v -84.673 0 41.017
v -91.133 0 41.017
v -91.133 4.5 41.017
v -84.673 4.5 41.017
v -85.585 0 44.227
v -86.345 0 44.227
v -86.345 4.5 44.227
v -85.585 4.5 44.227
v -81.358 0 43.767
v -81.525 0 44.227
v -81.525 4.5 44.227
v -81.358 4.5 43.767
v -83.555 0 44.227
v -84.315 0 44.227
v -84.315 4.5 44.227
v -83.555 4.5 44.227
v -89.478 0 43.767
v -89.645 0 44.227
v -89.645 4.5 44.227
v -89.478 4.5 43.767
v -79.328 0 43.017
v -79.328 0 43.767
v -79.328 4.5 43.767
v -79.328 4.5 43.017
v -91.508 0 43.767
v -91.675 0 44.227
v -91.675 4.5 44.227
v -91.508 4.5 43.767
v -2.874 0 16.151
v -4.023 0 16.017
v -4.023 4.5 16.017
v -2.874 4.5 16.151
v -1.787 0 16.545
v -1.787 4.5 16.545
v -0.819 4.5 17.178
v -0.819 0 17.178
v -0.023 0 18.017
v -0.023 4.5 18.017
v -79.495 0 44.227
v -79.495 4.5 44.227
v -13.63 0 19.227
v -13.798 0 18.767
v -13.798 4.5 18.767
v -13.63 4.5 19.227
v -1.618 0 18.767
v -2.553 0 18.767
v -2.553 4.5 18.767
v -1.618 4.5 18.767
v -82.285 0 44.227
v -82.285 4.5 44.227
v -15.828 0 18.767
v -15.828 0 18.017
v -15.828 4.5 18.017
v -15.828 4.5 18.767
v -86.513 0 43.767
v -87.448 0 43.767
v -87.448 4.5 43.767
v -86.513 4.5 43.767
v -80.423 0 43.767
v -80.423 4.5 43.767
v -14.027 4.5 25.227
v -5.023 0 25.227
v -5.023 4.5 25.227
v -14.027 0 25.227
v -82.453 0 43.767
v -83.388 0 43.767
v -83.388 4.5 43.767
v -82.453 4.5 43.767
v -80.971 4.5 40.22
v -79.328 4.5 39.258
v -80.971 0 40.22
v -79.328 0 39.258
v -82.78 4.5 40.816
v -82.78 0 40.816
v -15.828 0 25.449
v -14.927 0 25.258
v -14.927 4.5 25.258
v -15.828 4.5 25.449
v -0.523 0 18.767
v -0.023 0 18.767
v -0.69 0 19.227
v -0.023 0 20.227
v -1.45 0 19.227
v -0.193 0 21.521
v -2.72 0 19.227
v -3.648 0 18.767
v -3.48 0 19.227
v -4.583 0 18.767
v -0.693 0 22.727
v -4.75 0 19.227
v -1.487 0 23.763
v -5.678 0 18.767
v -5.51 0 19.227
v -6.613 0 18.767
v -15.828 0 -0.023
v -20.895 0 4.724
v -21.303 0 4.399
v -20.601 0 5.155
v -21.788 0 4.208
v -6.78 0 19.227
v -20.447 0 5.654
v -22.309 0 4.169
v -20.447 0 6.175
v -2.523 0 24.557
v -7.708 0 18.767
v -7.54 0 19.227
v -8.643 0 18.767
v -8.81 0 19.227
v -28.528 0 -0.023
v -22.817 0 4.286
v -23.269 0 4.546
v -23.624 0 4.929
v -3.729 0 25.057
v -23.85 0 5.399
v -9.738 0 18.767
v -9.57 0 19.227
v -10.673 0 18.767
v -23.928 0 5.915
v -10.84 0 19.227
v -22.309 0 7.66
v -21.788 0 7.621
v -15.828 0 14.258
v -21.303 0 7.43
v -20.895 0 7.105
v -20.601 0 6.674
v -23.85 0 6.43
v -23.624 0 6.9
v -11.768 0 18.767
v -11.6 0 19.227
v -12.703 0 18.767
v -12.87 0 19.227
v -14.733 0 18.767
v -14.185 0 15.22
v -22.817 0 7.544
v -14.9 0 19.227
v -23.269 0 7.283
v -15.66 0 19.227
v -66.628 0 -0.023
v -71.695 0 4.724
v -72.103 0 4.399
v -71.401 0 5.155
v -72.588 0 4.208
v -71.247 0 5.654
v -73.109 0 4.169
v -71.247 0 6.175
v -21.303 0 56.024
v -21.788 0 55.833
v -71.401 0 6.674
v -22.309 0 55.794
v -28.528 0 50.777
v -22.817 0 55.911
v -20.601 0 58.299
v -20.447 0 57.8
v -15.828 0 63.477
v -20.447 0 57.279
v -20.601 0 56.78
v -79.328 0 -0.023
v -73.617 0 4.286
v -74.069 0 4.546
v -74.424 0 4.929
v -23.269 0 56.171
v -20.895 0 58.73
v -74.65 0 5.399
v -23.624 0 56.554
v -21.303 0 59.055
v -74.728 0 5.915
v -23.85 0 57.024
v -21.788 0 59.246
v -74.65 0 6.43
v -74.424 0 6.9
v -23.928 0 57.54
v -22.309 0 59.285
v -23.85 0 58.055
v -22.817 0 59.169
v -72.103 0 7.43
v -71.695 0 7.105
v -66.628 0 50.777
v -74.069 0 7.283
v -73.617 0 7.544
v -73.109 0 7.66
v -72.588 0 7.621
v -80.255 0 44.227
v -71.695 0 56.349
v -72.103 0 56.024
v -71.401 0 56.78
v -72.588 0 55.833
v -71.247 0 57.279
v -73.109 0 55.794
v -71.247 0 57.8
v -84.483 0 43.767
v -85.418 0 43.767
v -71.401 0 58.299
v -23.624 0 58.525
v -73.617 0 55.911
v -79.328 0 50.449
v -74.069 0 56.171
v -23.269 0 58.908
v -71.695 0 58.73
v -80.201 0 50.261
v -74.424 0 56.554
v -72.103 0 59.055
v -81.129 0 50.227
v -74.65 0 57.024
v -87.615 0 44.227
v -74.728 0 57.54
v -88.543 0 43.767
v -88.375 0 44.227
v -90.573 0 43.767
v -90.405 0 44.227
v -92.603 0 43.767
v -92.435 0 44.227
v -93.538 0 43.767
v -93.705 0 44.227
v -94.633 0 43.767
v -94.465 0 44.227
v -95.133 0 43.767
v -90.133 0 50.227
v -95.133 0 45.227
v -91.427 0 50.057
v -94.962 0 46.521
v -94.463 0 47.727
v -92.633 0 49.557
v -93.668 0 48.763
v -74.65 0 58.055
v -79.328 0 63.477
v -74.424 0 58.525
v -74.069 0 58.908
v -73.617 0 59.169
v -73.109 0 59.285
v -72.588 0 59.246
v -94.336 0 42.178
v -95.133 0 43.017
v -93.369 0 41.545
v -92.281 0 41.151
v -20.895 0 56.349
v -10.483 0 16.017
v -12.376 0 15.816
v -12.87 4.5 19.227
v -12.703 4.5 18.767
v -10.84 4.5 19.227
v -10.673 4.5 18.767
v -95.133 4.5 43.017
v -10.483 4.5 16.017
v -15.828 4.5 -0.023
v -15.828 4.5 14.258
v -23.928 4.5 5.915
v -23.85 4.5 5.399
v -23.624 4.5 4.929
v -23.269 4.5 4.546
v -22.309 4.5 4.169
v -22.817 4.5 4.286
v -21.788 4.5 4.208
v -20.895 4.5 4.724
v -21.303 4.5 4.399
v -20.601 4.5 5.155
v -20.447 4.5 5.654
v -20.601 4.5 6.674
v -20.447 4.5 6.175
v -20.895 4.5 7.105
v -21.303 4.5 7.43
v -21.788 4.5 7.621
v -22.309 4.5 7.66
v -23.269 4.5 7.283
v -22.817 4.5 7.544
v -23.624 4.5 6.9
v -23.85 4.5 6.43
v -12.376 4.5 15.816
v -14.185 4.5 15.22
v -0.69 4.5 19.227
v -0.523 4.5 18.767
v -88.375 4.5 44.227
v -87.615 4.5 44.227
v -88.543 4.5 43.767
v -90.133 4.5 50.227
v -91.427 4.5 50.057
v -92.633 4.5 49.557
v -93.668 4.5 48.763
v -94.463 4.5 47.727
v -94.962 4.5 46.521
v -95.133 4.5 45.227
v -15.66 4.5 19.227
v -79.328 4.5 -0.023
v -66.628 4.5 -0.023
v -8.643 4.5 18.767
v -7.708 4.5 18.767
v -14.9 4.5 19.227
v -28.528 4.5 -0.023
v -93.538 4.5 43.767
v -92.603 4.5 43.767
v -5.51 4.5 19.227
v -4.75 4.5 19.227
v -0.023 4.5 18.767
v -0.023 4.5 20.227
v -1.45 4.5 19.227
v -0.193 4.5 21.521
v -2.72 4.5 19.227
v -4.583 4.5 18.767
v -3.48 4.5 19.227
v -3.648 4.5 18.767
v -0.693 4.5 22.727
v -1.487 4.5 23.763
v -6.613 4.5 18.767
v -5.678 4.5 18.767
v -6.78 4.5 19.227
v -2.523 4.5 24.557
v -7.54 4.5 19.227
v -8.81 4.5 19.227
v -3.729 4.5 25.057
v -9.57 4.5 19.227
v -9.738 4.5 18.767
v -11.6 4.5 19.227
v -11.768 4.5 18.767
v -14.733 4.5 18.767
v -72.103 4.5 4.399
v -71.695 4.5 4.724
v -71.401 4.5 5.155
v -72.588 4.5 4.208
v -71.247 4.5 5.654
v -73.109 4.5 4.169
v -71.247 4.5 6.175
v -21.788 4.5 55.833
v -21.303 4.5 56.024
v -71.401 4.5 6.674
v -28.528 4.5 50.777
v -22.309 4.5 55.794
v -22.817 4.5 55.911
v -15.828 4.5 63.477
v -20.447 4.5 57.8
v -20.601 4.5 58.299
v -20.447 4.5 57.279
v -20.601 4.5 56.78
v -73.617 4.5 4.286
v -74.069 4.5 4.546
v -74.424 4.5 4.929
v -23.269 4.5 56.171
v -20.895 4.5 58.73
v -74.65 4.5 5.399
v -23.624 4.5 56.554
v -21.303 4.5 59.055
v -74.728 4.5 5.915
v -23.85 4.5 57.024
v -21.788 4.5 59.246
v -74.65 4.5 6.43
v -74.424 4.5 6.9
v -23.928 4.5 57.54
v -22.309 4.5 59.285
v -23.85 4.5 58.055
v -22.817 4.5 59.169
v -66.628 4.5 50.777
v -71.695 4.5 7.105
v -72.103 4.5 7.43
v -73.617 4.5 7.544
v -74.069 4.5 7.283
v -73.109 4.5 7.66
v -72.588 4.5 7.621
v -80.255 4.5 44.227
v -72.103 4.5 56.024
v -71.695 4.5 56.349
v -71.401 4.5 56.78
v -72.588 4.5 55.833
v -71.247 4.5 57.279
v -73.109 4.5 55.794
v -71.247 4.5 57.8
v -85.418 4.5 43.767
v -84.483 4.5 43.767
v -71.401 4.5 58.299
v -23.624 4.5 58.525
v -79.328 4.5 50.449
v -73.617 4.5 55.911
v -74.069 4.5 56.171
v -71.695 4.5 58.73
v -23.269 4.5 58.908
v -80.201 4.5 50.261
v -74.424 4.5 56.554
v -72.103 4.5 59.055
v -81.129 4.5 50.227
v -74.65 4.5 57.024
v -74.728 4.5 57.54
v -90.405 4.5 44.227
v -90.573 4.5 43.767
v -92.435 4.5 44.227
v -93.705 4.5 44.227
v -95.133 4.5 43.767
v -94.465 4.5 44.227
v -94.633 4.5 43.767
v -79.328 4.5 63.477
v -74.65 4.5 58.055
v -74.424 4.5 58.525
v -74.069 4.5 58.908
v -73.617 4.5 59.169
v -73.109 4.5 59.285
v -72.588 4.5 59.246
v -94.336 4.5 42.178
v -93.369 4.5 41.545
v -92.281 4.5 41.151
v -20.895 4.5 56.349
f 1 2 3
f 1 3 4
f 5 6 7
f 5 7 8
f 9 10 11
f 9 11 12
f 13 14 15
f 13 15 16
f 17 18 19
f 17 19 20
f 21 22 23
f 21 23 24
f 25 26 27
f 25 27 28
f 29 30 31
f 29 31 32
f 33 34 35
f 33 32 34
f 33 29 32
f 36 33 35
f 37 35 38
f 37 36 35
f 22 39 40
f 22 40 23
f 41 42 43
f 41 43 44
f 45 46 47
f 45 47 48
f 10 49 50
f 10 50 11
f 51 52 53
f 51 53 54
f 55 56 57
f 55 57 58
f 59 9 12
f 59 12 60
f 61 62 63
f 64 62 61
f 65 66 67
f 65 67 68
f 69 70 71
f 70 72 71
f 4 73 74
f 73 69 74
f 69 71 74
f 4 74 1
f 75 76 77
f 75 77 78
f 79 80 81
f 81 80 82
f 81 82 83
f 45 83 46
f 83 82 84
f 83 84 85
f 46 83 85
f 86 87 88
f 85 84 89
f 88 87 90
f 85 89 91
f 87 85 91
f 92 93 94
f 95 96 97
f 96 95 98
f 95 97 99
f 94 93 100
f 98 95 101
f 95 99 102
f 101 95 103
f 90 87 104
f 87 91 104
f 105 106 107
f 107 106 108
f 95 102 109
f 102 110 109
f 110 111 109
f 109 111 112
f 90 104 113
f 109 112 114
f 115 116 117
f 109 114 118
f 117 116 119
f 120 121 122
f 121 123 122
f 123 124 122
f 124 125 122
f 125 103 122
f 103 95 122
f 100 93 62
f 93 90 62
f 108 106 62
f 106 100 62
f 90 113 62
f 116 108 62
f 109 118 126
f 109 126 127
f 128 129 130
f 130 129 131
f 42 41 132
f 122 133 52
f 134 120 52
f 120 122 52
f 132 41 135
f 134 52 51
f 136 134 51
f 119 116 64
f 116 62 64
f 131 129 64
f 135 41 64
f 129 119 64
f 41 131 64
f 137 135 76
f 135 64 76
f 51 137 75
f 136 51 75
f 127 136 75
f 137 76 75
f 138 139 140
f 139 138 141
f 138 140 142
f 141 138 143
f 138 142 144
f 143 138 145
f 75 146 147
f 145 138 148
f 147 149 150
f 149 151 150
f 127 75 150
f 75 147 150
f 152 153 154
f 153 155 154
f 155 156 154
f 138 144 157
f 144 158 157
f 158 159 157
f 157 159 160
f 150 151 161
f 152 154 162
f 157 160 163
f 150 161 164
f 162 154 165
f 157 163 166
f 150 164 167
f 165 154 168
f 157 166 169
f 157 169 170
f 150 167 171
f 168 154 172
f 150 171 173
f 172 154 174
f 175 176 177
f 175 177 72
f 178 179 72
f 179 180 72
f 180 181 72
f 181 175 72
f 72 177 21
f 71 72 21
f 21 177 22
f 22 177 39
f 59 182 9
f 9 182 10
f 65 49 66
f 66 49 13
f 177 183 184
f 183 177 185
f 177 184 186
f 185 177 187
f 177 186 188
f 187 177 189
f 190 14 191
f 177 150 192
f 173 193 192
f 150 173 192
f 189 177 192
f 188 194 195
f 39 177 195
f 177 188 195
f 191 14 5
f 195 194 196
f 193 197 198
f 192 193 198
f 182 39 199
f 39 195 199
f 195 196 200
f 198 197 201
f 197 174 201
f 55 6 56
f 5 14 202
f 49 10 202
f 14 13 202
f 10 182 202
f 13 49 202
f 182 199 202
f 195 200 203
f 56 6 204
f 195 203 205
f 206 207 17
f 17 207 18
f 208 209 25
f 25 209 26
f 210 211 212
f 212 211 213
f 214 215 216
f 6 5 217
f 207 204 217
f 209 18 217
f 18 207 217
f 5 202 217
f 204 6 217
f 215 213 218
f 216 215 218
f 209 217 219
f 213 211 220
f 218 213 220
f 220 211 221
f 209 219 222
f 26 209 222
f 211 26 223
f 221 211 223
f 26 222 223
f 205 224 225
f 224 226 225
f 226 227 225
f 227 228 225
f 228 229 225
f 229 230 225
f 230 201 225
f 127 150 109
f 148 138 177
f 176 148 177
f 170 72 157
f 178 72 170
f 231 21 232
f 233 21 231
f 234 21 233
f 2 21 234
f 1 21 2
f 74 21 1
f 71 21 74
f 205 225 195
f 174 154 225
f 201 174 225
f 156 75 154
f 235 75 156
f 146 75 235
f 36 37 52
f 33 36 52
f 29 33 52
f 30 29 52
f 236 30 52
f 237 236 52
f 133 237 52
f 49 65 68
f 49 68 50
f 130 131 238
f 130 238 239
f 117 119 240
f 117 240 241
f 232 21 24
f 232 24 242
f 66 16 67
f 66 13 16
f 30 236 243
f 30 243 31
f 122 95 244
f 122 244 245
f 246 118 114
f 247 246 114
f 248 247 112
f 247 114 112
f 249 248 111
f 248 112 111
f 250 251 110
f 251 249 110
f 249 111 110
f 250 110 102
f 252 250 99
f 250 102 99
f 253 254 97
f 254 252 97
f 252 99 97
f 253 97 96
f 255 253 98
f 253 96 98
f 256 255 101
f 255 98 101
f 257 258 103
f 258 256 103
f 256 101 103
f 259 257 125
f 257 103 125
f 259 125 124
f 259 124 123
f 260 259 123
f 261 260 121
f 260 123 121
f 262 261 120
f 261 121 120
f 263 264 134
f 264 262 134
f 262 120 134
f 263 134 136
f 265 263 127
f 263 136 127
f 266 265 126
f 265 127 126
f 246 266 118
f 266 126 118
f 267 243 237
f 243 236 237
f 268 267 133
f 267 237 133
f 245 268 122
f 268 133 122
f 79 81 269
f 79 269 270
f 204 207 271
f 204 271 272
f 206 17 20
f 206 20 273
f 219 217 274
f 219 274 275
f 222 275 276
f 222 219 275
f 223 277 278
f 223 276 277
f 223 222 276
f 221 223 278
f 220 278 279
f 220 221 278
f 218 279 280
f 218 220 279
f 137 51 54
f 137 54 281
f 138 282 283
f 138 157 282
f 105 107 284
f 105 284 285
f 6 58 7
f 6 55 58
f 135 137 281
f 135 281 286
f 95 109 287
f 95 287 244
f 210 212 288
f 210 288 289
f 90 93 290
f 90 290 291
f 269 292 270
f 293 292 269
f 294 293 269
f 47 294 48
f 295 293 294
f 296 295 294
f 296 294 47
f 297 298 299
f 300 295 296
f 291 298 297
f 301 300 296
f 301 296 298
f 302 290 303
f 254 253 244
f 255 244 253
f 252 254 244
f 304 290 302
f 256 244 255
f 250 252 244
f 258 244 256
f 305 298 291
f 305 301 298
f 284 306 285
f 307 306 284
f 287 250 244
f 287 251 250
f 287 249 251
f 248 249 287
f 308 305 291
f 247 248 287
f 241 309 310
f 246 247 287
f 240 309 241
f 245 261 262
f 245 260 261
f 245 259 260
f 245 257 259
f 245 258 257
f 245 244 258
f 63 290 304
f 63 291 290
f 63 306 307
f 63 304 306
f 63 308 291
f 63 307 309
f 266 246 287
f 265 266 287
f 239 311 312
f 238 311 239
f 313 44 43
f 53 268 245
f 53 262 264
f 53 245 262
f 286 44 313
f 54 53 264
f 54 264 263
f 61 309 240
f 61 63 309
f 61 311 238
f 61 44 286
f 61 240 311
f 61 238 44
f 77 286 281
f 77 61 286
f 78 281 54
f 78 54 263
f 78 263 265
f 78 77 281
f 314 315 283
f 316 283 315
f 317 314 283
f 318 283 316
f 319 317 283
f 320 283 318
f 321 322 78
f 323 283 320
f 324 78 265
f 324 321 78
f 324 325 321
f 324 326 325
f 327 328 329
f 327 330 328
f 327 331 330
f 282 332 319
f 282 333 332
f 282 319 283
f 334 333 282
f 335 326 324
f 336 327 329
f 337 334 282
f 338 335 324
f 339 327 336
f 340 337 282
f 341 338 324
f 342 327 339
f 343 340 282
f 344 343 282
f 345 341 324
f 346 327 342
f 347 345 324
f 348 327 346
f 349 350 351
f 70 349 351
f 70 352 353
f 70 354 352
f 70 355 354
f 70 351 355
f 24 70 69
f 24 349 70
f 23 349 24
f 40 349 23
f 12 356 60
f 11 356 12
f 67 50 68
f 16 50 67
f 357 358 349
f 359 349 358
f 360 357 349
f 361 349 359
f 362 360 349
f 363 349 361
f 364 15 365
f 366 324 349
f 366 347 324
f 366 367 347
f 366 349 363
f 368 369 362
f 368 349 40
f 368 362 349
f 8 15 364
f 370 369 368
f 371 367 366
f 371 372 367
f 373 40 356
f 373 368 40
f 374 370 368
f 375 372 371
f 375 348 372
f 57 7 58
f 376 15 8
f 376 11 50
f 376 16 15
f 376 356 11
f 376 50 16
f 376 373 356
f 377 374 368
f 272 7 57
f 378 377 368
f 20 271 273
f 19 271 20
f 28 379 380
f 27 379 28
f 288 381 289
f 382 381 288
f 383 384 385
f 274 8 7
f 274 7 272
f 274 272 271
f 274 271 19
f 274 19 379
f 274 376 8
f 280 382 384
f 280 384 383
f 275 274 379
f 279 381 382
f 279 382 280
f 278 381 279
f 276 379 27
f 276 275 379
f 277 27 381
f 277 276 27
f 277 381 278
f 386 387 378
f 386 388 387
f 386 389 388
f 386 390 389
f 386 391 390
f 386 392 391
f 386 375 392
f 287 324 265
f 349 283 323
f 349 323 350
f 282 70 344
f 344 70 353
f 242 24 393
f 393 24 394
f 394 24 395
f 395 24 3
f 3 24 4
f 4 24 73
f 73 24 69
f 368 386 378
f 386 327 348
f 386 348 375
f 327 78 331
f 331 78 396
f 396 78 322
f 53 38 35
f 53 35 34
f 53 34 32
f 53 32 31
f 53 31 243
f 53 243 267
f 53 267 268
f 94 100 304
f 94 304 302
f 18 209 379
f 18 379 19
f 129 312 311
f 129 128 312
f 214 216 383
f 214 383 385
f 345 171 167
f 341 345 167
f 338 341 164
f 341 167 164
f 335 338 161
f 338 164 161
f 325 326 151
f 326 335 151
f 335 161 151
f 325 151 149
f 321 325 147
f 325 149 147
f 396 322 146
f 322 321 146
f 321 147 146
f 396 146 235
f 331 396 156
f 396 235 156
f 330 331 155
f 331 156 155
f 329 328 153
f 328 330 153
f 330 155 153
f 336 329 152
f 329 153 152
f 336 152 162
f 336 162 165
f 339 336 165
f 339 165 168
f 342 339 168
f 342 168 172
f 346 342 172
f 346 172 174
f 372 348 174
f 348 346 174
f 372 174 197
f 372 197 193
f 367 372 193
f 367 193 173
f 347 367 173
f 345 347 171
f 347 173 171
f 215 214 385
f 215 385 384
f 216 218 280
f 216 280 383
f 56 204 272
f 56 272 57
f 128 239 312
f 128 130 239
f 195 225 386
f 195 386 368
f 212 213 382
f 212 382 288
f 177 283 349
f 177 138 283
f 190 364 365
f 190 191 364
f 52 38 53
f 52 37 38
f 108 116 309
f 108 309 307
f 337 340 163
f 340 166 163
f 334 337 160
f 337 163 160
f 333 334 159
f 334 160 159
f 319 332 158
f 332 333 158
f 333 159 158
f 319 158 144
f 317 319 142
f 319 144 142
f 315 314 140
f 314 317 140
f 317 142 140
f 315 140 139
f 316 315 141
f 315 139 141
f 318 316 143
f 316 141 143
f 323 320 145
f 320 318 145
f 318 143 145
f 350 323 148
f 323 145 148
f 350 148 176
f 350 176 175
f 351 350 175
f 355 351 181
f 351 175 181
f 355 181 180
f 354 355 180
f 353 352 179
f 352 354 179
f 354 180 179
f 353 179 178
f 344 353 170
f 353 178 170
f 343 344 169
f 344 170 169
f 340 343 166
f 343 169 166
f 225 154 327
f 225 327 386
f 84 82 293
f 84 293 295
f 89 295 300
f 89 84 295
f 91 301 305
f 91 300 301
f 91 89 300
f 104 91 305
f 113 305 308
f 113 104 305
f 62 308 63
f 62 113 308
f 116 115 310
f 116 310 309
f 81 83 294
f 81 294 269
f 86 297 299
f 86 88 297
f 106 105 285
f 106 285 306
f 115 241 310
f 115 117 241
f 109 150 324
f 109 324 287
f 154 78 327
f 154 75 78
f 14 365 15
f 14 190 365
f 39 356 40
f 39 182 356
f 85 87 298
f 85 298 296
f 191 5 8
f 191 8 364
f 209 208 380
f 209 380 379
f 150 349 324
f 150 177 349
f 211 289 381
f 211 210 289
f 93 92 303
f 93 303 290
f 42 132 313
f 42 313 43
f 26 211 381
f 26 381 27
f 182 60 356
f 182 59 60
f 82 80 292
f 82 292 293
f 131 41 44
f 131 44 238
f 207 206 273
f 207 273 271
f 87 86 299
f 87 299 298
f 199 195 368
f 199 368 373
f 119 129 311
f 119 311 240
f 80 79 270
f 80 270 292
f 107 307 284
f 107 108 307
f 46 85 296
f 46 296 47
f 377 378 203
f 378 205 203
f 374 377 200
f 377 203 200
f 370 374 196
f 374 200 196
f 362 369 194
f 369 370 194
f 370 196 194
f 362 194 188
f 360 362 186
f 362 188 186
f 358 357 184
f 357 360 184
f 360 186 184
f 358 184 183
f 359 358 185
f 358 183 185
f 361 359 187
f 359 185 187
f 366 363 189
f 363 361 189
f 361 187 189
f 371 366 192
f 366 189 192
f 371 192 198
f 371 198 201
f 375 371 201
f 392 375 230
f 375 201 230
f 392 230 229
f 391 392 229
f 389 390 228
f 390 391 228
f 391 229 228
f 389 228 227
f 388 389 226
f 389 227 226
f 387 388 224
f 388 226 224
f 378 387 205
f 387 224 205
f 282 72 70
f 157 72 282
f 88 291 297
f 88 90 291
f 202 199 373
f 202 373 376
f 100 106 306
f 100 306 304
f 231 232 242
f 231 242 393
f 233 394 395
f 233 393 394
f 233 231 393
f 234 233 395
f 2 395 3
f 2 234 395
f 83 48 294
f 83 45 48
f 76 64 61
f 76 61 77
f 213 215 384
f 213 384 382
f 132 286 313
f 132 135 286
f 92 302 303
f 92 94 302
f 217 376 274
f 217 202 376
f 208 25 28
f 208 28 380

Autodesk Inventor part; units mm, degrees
ref_plane "YZ Plane" through (0, 0, 0) normal (1, 0, 0) x (0, 1, 0)
ref_plane "XZ Plane" through (0, 0, 0) normal (0, 1, 0) x (-1, 0, 0)
ref_plane "XY Plane" through (0, 0, 0) normal (0, 0, 1) x (1, 0, 0)
sketch "Sketch1" plane through (0, 0, 0) normal (0, 1, 0) x (-1, 0, 0)
  line L0 (15.8278, -0.0229) -> (15.8278, 14.2578)
  arc A0 (15.8278, 14.2578) -> (10.4826, 16.0171) centre (10.4826, 7.0171) ccw
  line L1 (10.4826, 16.0171) -> (4.0229, 16.0171)
  arc A1 (0.0229, 18.0171) -> (4.0229, 16.0171) centre (4.0229, 21.0171) ccw
  line L2 (0.0229, 18.0171) -> (15.8278, 18.0171)
  line L3 (15.8278, 18.0171) -> (15.8278, 18.7671)
  line L4 (15.8278, 18.7671) -> (15.6604, 19.2271)
  line L5 (15.6604, 19.2271) -> (14.9004, 19.2271)
  line L6 (14.9004, 19.2271) -> (14.7329, 18.7671)
  line L7 (14.7329, 18.7671) -> (13.7978, 18.7671)
  line L8 (13.7978, 18.7671) -> (13.6304, 19.2271)
  line L9 (13.6304, 19.2271) -> (12.8704, 19.2271)
  line L10 (12.8704, 19.2271) -> (12.7029, 18.7671)
  line L11 (12.7029, 18.7671) -> (11.7678, 18.7671)
  line L12 (11.7678, 18.7671) -> (11.6004, 19.2271)
  line L13 (11.6004, 19.2271) -> (10.8404, 19.2271)
  line L14 (10.8404, 19.2271) -> (10.6729, 18.7671)
  line L15 (10.6729, 18.7671) -> (9.7378, 18.7671)
  line L16 (9.7378, 18.7671) -> (9.5704, 19.2271)
  line L17 (9.5704, 19.2271) -> (8.8104, 19.2271)
  line L18 (8.8104, 19.2271) -> (8.6429, 18.7671)
  line L19 (8.6429, 18.7671) -> (7.7078, 18.7671)
  line L20 (7.7078, 18.7671) -> (7.5404, 19.2271)
  line L21 (7.5404, 19.2271) -> (6.7804, 19.2271)
  line L22 (6.7804, 19.2271) -> (6.6129, 18.7671)
  line L23 (6.6129, 18.7671) -> (5.6778, 18.7671)
  line L24 (5.6778, 18.7671) -> (5.5104, 19.2271)
  line L25 (5.5104, 19.2271) -> (4.7504, 19.2271)
  line L26 (4.7504, 19.2271) -> (4.5829, 18.7671)
  line L27 (4.5829, 18.7671) -> (3.6478, 18.7671)
  line L28 (3.6478, 18.7671) -> (3.4804, 19.2271)
  line L29 (3.4804, 19.2271) -> (2.7204, 19.2271)
  line L30 (2.7204, 19.2271) -> (2.5529, 18.7671)
  line L31 (2.5529, 18.7671) -> (1.6178, 18.7671)
  line L32 (1.6178, 18.7671) -> (1.4504, 19.2271)
  line L33 (1.4504, 19.2271) -> (0.6904, 19.2271)
  line L34 (0.6904, 19.2271) -> (0.5229, 18.7671)
  line L35 (0.5229, 18.7671) -> (0.0229, 18.7671)
  line L36 (0.0229, 18.7671) -> (0.0229, 20.2271)
  arc A2 (5.0229, 25.2271) -> (0.0229, 20.2271) centre (5.0229, 20.2271) ccw
  line L37 (5.0229, 25.2271) -> (14.0269, 25.2271)
  line L38 (14.0269, 25.2271) -> (14.9274, 25.2583)
  line L39 (14.9274, 25.2583) -> (15.8278, 25.4494)
  line L40 (15.8278, 25.4494) -> (15.8278, 63.4771)
  line L41 (15.8278, 63.4771) -> (79.3278, 63.4771)
  line L42 (79.3278, 63.4771) -> (79.3278, 50.4494)
  line L43 (79.3278, 50.4494) -> (80.2012, 50.261)
  line L44 (80.2012, 50.261) -> (81.1287, 50.2271)
  line L45 (81.1287, 50.2271) -> (90.1326, 50.2271)
  arc A3 (95.1326, 45.2271) -> (90.1326, 50.2271) centre (90.1326, 45.2271) ccw
  line L46 (95.1326, 45.2271) -> (95.1326, 43.7671)
  line L47 (95.1326, 43.7671) -> (94.6326, 43.7671)
  line L48 (94.6326, 43.7671) -> (94.4652, 44.2271)
  line L49 (94.4652, 44.2271) -> (93.7052, 44.2271)
  line L50 (93.7052, 44.2271) -> (93.5378, 43.7671)
  line L51 (93.5378, 43.7671) -> (92.6026, 43.7671)
  line L52 (92.6026, 43.7671) -> (92.4352, 44.2271)
  line L53 (92.4352, 44.2271) -> (91.6752, 44.2271)
  line L54 (91.6752, 44.2271) -> (91.5078, 43.7671)
  line L55 (91.5078, 43.7671) -> (90.5726, 43.7671)
  line L56 (90.5726, 43.7671) -> (90.4052, 44.2271)
  line L57 (90.4052, 44.2271) -> (89.6452, 44.2271)
  line L58 (89.6452, 44.2271) -> (89.4778, 43.7671)
  line L59 (89.4778, 43.7671) -> (88.5426, 43.7671)
  line L60 (88.5426, 43.7671) -> (88.3752, 44.2271)
  line L61 (88.3752, 44.2271) -> (87.6152, 44.2271)
  line L62 (87.6152, 44.2271) -> (87.4478, 43.7671)
  line L63 (87.4478, 43.7671) -> (86.5126, 43.7671)
  line L64 (86.5126, 43.7671) -> (86.3452, 44.2271)
  line L65 (86.3452, 44.2271) -> (85.5852, 44.2271)
  line L66 (85.5852, 44.2271) -> (85.4178, 43.7671)
  line L67 (85.4178, 43.7671) -> (84.4826, 43.7671)
  line L68 (84.4826, 43.7671) -> (84.3152, 44.2271)
  line L69 (84.3152, 44.2271) -> (83.5552, 44.2271)
  line L70 (83.5552, 44.2271) -> (83.3878, 43.7671)
  line L71 (83.3878, 43.7671) -> (82.4526, 43.7671)
  line L72 (82.4526, 43.7671) -> (82.2852, 44.2271)
  line L73 (82.2852, 44.2271) -> (81.5252, 44.2271)
  line L74 (81.5252, 44.2271) -> (81.3578, 43.7671)
  line L75 (81.3578, 43.7671) -> (80.4226, 43.7671)
  line L76 (80.4226, 43.7671) -> (80.2552, 44.2271)
  line L77 (80.2552, 44.2271) -> (79.4952, 44.2271)
  line L78 (79.4952, 44.2271) -> (79.3278, 43.7671)
  line L79 (79.3278, 43.7671) -> (79.3278, 43.0171)
  line L80 (79.3278, 43.0171) -> (95.1326, 43.0171)
  arc A4 (91.1326, 41.0171) -> (95.1326, 43.0171) centre (91.1326, 46.0171) ccw
  line L81 (91.1326, 41.0171) -> (84.673, 41.0171)
  arc A5 (84.673, 41.0171) -> (79.3278, 39.2578) centre (84.673, 32.0171) ccw
  line L82 (79.3278, 39.2578) -> (79.3278, -0.0229)
  line L83 (79.3278, -0.0229) -> (66.6278, -0.0229)
  line L84 (66.6278, -0.0229) -> (66.6278, 50.7771)
  line L85 (66.6278, 50.7771) -> (28.5278, 50.7771)
  line L86 (28.5278, 50.7771) -> (28.5278, -0.0229)
  line L87 (28.5278, -0.0229) -> (15.8278, -0.0229)
  circle A6 centre (22.1778, 5.9146) radius 1.75
  circle A7 centre (22.1778, 57.5396) radius 1.75
  circle A8 centre (72.9778, 57.5396) radius 1.75
  circle A9 centre (72.9778, 5.9146) radius 1.75
  point P0 (0, 0)
extrude "Extrusion1" add sketch "Sketch1" along normal blind 4.5
properties part number "x carriage belt tensioner"
